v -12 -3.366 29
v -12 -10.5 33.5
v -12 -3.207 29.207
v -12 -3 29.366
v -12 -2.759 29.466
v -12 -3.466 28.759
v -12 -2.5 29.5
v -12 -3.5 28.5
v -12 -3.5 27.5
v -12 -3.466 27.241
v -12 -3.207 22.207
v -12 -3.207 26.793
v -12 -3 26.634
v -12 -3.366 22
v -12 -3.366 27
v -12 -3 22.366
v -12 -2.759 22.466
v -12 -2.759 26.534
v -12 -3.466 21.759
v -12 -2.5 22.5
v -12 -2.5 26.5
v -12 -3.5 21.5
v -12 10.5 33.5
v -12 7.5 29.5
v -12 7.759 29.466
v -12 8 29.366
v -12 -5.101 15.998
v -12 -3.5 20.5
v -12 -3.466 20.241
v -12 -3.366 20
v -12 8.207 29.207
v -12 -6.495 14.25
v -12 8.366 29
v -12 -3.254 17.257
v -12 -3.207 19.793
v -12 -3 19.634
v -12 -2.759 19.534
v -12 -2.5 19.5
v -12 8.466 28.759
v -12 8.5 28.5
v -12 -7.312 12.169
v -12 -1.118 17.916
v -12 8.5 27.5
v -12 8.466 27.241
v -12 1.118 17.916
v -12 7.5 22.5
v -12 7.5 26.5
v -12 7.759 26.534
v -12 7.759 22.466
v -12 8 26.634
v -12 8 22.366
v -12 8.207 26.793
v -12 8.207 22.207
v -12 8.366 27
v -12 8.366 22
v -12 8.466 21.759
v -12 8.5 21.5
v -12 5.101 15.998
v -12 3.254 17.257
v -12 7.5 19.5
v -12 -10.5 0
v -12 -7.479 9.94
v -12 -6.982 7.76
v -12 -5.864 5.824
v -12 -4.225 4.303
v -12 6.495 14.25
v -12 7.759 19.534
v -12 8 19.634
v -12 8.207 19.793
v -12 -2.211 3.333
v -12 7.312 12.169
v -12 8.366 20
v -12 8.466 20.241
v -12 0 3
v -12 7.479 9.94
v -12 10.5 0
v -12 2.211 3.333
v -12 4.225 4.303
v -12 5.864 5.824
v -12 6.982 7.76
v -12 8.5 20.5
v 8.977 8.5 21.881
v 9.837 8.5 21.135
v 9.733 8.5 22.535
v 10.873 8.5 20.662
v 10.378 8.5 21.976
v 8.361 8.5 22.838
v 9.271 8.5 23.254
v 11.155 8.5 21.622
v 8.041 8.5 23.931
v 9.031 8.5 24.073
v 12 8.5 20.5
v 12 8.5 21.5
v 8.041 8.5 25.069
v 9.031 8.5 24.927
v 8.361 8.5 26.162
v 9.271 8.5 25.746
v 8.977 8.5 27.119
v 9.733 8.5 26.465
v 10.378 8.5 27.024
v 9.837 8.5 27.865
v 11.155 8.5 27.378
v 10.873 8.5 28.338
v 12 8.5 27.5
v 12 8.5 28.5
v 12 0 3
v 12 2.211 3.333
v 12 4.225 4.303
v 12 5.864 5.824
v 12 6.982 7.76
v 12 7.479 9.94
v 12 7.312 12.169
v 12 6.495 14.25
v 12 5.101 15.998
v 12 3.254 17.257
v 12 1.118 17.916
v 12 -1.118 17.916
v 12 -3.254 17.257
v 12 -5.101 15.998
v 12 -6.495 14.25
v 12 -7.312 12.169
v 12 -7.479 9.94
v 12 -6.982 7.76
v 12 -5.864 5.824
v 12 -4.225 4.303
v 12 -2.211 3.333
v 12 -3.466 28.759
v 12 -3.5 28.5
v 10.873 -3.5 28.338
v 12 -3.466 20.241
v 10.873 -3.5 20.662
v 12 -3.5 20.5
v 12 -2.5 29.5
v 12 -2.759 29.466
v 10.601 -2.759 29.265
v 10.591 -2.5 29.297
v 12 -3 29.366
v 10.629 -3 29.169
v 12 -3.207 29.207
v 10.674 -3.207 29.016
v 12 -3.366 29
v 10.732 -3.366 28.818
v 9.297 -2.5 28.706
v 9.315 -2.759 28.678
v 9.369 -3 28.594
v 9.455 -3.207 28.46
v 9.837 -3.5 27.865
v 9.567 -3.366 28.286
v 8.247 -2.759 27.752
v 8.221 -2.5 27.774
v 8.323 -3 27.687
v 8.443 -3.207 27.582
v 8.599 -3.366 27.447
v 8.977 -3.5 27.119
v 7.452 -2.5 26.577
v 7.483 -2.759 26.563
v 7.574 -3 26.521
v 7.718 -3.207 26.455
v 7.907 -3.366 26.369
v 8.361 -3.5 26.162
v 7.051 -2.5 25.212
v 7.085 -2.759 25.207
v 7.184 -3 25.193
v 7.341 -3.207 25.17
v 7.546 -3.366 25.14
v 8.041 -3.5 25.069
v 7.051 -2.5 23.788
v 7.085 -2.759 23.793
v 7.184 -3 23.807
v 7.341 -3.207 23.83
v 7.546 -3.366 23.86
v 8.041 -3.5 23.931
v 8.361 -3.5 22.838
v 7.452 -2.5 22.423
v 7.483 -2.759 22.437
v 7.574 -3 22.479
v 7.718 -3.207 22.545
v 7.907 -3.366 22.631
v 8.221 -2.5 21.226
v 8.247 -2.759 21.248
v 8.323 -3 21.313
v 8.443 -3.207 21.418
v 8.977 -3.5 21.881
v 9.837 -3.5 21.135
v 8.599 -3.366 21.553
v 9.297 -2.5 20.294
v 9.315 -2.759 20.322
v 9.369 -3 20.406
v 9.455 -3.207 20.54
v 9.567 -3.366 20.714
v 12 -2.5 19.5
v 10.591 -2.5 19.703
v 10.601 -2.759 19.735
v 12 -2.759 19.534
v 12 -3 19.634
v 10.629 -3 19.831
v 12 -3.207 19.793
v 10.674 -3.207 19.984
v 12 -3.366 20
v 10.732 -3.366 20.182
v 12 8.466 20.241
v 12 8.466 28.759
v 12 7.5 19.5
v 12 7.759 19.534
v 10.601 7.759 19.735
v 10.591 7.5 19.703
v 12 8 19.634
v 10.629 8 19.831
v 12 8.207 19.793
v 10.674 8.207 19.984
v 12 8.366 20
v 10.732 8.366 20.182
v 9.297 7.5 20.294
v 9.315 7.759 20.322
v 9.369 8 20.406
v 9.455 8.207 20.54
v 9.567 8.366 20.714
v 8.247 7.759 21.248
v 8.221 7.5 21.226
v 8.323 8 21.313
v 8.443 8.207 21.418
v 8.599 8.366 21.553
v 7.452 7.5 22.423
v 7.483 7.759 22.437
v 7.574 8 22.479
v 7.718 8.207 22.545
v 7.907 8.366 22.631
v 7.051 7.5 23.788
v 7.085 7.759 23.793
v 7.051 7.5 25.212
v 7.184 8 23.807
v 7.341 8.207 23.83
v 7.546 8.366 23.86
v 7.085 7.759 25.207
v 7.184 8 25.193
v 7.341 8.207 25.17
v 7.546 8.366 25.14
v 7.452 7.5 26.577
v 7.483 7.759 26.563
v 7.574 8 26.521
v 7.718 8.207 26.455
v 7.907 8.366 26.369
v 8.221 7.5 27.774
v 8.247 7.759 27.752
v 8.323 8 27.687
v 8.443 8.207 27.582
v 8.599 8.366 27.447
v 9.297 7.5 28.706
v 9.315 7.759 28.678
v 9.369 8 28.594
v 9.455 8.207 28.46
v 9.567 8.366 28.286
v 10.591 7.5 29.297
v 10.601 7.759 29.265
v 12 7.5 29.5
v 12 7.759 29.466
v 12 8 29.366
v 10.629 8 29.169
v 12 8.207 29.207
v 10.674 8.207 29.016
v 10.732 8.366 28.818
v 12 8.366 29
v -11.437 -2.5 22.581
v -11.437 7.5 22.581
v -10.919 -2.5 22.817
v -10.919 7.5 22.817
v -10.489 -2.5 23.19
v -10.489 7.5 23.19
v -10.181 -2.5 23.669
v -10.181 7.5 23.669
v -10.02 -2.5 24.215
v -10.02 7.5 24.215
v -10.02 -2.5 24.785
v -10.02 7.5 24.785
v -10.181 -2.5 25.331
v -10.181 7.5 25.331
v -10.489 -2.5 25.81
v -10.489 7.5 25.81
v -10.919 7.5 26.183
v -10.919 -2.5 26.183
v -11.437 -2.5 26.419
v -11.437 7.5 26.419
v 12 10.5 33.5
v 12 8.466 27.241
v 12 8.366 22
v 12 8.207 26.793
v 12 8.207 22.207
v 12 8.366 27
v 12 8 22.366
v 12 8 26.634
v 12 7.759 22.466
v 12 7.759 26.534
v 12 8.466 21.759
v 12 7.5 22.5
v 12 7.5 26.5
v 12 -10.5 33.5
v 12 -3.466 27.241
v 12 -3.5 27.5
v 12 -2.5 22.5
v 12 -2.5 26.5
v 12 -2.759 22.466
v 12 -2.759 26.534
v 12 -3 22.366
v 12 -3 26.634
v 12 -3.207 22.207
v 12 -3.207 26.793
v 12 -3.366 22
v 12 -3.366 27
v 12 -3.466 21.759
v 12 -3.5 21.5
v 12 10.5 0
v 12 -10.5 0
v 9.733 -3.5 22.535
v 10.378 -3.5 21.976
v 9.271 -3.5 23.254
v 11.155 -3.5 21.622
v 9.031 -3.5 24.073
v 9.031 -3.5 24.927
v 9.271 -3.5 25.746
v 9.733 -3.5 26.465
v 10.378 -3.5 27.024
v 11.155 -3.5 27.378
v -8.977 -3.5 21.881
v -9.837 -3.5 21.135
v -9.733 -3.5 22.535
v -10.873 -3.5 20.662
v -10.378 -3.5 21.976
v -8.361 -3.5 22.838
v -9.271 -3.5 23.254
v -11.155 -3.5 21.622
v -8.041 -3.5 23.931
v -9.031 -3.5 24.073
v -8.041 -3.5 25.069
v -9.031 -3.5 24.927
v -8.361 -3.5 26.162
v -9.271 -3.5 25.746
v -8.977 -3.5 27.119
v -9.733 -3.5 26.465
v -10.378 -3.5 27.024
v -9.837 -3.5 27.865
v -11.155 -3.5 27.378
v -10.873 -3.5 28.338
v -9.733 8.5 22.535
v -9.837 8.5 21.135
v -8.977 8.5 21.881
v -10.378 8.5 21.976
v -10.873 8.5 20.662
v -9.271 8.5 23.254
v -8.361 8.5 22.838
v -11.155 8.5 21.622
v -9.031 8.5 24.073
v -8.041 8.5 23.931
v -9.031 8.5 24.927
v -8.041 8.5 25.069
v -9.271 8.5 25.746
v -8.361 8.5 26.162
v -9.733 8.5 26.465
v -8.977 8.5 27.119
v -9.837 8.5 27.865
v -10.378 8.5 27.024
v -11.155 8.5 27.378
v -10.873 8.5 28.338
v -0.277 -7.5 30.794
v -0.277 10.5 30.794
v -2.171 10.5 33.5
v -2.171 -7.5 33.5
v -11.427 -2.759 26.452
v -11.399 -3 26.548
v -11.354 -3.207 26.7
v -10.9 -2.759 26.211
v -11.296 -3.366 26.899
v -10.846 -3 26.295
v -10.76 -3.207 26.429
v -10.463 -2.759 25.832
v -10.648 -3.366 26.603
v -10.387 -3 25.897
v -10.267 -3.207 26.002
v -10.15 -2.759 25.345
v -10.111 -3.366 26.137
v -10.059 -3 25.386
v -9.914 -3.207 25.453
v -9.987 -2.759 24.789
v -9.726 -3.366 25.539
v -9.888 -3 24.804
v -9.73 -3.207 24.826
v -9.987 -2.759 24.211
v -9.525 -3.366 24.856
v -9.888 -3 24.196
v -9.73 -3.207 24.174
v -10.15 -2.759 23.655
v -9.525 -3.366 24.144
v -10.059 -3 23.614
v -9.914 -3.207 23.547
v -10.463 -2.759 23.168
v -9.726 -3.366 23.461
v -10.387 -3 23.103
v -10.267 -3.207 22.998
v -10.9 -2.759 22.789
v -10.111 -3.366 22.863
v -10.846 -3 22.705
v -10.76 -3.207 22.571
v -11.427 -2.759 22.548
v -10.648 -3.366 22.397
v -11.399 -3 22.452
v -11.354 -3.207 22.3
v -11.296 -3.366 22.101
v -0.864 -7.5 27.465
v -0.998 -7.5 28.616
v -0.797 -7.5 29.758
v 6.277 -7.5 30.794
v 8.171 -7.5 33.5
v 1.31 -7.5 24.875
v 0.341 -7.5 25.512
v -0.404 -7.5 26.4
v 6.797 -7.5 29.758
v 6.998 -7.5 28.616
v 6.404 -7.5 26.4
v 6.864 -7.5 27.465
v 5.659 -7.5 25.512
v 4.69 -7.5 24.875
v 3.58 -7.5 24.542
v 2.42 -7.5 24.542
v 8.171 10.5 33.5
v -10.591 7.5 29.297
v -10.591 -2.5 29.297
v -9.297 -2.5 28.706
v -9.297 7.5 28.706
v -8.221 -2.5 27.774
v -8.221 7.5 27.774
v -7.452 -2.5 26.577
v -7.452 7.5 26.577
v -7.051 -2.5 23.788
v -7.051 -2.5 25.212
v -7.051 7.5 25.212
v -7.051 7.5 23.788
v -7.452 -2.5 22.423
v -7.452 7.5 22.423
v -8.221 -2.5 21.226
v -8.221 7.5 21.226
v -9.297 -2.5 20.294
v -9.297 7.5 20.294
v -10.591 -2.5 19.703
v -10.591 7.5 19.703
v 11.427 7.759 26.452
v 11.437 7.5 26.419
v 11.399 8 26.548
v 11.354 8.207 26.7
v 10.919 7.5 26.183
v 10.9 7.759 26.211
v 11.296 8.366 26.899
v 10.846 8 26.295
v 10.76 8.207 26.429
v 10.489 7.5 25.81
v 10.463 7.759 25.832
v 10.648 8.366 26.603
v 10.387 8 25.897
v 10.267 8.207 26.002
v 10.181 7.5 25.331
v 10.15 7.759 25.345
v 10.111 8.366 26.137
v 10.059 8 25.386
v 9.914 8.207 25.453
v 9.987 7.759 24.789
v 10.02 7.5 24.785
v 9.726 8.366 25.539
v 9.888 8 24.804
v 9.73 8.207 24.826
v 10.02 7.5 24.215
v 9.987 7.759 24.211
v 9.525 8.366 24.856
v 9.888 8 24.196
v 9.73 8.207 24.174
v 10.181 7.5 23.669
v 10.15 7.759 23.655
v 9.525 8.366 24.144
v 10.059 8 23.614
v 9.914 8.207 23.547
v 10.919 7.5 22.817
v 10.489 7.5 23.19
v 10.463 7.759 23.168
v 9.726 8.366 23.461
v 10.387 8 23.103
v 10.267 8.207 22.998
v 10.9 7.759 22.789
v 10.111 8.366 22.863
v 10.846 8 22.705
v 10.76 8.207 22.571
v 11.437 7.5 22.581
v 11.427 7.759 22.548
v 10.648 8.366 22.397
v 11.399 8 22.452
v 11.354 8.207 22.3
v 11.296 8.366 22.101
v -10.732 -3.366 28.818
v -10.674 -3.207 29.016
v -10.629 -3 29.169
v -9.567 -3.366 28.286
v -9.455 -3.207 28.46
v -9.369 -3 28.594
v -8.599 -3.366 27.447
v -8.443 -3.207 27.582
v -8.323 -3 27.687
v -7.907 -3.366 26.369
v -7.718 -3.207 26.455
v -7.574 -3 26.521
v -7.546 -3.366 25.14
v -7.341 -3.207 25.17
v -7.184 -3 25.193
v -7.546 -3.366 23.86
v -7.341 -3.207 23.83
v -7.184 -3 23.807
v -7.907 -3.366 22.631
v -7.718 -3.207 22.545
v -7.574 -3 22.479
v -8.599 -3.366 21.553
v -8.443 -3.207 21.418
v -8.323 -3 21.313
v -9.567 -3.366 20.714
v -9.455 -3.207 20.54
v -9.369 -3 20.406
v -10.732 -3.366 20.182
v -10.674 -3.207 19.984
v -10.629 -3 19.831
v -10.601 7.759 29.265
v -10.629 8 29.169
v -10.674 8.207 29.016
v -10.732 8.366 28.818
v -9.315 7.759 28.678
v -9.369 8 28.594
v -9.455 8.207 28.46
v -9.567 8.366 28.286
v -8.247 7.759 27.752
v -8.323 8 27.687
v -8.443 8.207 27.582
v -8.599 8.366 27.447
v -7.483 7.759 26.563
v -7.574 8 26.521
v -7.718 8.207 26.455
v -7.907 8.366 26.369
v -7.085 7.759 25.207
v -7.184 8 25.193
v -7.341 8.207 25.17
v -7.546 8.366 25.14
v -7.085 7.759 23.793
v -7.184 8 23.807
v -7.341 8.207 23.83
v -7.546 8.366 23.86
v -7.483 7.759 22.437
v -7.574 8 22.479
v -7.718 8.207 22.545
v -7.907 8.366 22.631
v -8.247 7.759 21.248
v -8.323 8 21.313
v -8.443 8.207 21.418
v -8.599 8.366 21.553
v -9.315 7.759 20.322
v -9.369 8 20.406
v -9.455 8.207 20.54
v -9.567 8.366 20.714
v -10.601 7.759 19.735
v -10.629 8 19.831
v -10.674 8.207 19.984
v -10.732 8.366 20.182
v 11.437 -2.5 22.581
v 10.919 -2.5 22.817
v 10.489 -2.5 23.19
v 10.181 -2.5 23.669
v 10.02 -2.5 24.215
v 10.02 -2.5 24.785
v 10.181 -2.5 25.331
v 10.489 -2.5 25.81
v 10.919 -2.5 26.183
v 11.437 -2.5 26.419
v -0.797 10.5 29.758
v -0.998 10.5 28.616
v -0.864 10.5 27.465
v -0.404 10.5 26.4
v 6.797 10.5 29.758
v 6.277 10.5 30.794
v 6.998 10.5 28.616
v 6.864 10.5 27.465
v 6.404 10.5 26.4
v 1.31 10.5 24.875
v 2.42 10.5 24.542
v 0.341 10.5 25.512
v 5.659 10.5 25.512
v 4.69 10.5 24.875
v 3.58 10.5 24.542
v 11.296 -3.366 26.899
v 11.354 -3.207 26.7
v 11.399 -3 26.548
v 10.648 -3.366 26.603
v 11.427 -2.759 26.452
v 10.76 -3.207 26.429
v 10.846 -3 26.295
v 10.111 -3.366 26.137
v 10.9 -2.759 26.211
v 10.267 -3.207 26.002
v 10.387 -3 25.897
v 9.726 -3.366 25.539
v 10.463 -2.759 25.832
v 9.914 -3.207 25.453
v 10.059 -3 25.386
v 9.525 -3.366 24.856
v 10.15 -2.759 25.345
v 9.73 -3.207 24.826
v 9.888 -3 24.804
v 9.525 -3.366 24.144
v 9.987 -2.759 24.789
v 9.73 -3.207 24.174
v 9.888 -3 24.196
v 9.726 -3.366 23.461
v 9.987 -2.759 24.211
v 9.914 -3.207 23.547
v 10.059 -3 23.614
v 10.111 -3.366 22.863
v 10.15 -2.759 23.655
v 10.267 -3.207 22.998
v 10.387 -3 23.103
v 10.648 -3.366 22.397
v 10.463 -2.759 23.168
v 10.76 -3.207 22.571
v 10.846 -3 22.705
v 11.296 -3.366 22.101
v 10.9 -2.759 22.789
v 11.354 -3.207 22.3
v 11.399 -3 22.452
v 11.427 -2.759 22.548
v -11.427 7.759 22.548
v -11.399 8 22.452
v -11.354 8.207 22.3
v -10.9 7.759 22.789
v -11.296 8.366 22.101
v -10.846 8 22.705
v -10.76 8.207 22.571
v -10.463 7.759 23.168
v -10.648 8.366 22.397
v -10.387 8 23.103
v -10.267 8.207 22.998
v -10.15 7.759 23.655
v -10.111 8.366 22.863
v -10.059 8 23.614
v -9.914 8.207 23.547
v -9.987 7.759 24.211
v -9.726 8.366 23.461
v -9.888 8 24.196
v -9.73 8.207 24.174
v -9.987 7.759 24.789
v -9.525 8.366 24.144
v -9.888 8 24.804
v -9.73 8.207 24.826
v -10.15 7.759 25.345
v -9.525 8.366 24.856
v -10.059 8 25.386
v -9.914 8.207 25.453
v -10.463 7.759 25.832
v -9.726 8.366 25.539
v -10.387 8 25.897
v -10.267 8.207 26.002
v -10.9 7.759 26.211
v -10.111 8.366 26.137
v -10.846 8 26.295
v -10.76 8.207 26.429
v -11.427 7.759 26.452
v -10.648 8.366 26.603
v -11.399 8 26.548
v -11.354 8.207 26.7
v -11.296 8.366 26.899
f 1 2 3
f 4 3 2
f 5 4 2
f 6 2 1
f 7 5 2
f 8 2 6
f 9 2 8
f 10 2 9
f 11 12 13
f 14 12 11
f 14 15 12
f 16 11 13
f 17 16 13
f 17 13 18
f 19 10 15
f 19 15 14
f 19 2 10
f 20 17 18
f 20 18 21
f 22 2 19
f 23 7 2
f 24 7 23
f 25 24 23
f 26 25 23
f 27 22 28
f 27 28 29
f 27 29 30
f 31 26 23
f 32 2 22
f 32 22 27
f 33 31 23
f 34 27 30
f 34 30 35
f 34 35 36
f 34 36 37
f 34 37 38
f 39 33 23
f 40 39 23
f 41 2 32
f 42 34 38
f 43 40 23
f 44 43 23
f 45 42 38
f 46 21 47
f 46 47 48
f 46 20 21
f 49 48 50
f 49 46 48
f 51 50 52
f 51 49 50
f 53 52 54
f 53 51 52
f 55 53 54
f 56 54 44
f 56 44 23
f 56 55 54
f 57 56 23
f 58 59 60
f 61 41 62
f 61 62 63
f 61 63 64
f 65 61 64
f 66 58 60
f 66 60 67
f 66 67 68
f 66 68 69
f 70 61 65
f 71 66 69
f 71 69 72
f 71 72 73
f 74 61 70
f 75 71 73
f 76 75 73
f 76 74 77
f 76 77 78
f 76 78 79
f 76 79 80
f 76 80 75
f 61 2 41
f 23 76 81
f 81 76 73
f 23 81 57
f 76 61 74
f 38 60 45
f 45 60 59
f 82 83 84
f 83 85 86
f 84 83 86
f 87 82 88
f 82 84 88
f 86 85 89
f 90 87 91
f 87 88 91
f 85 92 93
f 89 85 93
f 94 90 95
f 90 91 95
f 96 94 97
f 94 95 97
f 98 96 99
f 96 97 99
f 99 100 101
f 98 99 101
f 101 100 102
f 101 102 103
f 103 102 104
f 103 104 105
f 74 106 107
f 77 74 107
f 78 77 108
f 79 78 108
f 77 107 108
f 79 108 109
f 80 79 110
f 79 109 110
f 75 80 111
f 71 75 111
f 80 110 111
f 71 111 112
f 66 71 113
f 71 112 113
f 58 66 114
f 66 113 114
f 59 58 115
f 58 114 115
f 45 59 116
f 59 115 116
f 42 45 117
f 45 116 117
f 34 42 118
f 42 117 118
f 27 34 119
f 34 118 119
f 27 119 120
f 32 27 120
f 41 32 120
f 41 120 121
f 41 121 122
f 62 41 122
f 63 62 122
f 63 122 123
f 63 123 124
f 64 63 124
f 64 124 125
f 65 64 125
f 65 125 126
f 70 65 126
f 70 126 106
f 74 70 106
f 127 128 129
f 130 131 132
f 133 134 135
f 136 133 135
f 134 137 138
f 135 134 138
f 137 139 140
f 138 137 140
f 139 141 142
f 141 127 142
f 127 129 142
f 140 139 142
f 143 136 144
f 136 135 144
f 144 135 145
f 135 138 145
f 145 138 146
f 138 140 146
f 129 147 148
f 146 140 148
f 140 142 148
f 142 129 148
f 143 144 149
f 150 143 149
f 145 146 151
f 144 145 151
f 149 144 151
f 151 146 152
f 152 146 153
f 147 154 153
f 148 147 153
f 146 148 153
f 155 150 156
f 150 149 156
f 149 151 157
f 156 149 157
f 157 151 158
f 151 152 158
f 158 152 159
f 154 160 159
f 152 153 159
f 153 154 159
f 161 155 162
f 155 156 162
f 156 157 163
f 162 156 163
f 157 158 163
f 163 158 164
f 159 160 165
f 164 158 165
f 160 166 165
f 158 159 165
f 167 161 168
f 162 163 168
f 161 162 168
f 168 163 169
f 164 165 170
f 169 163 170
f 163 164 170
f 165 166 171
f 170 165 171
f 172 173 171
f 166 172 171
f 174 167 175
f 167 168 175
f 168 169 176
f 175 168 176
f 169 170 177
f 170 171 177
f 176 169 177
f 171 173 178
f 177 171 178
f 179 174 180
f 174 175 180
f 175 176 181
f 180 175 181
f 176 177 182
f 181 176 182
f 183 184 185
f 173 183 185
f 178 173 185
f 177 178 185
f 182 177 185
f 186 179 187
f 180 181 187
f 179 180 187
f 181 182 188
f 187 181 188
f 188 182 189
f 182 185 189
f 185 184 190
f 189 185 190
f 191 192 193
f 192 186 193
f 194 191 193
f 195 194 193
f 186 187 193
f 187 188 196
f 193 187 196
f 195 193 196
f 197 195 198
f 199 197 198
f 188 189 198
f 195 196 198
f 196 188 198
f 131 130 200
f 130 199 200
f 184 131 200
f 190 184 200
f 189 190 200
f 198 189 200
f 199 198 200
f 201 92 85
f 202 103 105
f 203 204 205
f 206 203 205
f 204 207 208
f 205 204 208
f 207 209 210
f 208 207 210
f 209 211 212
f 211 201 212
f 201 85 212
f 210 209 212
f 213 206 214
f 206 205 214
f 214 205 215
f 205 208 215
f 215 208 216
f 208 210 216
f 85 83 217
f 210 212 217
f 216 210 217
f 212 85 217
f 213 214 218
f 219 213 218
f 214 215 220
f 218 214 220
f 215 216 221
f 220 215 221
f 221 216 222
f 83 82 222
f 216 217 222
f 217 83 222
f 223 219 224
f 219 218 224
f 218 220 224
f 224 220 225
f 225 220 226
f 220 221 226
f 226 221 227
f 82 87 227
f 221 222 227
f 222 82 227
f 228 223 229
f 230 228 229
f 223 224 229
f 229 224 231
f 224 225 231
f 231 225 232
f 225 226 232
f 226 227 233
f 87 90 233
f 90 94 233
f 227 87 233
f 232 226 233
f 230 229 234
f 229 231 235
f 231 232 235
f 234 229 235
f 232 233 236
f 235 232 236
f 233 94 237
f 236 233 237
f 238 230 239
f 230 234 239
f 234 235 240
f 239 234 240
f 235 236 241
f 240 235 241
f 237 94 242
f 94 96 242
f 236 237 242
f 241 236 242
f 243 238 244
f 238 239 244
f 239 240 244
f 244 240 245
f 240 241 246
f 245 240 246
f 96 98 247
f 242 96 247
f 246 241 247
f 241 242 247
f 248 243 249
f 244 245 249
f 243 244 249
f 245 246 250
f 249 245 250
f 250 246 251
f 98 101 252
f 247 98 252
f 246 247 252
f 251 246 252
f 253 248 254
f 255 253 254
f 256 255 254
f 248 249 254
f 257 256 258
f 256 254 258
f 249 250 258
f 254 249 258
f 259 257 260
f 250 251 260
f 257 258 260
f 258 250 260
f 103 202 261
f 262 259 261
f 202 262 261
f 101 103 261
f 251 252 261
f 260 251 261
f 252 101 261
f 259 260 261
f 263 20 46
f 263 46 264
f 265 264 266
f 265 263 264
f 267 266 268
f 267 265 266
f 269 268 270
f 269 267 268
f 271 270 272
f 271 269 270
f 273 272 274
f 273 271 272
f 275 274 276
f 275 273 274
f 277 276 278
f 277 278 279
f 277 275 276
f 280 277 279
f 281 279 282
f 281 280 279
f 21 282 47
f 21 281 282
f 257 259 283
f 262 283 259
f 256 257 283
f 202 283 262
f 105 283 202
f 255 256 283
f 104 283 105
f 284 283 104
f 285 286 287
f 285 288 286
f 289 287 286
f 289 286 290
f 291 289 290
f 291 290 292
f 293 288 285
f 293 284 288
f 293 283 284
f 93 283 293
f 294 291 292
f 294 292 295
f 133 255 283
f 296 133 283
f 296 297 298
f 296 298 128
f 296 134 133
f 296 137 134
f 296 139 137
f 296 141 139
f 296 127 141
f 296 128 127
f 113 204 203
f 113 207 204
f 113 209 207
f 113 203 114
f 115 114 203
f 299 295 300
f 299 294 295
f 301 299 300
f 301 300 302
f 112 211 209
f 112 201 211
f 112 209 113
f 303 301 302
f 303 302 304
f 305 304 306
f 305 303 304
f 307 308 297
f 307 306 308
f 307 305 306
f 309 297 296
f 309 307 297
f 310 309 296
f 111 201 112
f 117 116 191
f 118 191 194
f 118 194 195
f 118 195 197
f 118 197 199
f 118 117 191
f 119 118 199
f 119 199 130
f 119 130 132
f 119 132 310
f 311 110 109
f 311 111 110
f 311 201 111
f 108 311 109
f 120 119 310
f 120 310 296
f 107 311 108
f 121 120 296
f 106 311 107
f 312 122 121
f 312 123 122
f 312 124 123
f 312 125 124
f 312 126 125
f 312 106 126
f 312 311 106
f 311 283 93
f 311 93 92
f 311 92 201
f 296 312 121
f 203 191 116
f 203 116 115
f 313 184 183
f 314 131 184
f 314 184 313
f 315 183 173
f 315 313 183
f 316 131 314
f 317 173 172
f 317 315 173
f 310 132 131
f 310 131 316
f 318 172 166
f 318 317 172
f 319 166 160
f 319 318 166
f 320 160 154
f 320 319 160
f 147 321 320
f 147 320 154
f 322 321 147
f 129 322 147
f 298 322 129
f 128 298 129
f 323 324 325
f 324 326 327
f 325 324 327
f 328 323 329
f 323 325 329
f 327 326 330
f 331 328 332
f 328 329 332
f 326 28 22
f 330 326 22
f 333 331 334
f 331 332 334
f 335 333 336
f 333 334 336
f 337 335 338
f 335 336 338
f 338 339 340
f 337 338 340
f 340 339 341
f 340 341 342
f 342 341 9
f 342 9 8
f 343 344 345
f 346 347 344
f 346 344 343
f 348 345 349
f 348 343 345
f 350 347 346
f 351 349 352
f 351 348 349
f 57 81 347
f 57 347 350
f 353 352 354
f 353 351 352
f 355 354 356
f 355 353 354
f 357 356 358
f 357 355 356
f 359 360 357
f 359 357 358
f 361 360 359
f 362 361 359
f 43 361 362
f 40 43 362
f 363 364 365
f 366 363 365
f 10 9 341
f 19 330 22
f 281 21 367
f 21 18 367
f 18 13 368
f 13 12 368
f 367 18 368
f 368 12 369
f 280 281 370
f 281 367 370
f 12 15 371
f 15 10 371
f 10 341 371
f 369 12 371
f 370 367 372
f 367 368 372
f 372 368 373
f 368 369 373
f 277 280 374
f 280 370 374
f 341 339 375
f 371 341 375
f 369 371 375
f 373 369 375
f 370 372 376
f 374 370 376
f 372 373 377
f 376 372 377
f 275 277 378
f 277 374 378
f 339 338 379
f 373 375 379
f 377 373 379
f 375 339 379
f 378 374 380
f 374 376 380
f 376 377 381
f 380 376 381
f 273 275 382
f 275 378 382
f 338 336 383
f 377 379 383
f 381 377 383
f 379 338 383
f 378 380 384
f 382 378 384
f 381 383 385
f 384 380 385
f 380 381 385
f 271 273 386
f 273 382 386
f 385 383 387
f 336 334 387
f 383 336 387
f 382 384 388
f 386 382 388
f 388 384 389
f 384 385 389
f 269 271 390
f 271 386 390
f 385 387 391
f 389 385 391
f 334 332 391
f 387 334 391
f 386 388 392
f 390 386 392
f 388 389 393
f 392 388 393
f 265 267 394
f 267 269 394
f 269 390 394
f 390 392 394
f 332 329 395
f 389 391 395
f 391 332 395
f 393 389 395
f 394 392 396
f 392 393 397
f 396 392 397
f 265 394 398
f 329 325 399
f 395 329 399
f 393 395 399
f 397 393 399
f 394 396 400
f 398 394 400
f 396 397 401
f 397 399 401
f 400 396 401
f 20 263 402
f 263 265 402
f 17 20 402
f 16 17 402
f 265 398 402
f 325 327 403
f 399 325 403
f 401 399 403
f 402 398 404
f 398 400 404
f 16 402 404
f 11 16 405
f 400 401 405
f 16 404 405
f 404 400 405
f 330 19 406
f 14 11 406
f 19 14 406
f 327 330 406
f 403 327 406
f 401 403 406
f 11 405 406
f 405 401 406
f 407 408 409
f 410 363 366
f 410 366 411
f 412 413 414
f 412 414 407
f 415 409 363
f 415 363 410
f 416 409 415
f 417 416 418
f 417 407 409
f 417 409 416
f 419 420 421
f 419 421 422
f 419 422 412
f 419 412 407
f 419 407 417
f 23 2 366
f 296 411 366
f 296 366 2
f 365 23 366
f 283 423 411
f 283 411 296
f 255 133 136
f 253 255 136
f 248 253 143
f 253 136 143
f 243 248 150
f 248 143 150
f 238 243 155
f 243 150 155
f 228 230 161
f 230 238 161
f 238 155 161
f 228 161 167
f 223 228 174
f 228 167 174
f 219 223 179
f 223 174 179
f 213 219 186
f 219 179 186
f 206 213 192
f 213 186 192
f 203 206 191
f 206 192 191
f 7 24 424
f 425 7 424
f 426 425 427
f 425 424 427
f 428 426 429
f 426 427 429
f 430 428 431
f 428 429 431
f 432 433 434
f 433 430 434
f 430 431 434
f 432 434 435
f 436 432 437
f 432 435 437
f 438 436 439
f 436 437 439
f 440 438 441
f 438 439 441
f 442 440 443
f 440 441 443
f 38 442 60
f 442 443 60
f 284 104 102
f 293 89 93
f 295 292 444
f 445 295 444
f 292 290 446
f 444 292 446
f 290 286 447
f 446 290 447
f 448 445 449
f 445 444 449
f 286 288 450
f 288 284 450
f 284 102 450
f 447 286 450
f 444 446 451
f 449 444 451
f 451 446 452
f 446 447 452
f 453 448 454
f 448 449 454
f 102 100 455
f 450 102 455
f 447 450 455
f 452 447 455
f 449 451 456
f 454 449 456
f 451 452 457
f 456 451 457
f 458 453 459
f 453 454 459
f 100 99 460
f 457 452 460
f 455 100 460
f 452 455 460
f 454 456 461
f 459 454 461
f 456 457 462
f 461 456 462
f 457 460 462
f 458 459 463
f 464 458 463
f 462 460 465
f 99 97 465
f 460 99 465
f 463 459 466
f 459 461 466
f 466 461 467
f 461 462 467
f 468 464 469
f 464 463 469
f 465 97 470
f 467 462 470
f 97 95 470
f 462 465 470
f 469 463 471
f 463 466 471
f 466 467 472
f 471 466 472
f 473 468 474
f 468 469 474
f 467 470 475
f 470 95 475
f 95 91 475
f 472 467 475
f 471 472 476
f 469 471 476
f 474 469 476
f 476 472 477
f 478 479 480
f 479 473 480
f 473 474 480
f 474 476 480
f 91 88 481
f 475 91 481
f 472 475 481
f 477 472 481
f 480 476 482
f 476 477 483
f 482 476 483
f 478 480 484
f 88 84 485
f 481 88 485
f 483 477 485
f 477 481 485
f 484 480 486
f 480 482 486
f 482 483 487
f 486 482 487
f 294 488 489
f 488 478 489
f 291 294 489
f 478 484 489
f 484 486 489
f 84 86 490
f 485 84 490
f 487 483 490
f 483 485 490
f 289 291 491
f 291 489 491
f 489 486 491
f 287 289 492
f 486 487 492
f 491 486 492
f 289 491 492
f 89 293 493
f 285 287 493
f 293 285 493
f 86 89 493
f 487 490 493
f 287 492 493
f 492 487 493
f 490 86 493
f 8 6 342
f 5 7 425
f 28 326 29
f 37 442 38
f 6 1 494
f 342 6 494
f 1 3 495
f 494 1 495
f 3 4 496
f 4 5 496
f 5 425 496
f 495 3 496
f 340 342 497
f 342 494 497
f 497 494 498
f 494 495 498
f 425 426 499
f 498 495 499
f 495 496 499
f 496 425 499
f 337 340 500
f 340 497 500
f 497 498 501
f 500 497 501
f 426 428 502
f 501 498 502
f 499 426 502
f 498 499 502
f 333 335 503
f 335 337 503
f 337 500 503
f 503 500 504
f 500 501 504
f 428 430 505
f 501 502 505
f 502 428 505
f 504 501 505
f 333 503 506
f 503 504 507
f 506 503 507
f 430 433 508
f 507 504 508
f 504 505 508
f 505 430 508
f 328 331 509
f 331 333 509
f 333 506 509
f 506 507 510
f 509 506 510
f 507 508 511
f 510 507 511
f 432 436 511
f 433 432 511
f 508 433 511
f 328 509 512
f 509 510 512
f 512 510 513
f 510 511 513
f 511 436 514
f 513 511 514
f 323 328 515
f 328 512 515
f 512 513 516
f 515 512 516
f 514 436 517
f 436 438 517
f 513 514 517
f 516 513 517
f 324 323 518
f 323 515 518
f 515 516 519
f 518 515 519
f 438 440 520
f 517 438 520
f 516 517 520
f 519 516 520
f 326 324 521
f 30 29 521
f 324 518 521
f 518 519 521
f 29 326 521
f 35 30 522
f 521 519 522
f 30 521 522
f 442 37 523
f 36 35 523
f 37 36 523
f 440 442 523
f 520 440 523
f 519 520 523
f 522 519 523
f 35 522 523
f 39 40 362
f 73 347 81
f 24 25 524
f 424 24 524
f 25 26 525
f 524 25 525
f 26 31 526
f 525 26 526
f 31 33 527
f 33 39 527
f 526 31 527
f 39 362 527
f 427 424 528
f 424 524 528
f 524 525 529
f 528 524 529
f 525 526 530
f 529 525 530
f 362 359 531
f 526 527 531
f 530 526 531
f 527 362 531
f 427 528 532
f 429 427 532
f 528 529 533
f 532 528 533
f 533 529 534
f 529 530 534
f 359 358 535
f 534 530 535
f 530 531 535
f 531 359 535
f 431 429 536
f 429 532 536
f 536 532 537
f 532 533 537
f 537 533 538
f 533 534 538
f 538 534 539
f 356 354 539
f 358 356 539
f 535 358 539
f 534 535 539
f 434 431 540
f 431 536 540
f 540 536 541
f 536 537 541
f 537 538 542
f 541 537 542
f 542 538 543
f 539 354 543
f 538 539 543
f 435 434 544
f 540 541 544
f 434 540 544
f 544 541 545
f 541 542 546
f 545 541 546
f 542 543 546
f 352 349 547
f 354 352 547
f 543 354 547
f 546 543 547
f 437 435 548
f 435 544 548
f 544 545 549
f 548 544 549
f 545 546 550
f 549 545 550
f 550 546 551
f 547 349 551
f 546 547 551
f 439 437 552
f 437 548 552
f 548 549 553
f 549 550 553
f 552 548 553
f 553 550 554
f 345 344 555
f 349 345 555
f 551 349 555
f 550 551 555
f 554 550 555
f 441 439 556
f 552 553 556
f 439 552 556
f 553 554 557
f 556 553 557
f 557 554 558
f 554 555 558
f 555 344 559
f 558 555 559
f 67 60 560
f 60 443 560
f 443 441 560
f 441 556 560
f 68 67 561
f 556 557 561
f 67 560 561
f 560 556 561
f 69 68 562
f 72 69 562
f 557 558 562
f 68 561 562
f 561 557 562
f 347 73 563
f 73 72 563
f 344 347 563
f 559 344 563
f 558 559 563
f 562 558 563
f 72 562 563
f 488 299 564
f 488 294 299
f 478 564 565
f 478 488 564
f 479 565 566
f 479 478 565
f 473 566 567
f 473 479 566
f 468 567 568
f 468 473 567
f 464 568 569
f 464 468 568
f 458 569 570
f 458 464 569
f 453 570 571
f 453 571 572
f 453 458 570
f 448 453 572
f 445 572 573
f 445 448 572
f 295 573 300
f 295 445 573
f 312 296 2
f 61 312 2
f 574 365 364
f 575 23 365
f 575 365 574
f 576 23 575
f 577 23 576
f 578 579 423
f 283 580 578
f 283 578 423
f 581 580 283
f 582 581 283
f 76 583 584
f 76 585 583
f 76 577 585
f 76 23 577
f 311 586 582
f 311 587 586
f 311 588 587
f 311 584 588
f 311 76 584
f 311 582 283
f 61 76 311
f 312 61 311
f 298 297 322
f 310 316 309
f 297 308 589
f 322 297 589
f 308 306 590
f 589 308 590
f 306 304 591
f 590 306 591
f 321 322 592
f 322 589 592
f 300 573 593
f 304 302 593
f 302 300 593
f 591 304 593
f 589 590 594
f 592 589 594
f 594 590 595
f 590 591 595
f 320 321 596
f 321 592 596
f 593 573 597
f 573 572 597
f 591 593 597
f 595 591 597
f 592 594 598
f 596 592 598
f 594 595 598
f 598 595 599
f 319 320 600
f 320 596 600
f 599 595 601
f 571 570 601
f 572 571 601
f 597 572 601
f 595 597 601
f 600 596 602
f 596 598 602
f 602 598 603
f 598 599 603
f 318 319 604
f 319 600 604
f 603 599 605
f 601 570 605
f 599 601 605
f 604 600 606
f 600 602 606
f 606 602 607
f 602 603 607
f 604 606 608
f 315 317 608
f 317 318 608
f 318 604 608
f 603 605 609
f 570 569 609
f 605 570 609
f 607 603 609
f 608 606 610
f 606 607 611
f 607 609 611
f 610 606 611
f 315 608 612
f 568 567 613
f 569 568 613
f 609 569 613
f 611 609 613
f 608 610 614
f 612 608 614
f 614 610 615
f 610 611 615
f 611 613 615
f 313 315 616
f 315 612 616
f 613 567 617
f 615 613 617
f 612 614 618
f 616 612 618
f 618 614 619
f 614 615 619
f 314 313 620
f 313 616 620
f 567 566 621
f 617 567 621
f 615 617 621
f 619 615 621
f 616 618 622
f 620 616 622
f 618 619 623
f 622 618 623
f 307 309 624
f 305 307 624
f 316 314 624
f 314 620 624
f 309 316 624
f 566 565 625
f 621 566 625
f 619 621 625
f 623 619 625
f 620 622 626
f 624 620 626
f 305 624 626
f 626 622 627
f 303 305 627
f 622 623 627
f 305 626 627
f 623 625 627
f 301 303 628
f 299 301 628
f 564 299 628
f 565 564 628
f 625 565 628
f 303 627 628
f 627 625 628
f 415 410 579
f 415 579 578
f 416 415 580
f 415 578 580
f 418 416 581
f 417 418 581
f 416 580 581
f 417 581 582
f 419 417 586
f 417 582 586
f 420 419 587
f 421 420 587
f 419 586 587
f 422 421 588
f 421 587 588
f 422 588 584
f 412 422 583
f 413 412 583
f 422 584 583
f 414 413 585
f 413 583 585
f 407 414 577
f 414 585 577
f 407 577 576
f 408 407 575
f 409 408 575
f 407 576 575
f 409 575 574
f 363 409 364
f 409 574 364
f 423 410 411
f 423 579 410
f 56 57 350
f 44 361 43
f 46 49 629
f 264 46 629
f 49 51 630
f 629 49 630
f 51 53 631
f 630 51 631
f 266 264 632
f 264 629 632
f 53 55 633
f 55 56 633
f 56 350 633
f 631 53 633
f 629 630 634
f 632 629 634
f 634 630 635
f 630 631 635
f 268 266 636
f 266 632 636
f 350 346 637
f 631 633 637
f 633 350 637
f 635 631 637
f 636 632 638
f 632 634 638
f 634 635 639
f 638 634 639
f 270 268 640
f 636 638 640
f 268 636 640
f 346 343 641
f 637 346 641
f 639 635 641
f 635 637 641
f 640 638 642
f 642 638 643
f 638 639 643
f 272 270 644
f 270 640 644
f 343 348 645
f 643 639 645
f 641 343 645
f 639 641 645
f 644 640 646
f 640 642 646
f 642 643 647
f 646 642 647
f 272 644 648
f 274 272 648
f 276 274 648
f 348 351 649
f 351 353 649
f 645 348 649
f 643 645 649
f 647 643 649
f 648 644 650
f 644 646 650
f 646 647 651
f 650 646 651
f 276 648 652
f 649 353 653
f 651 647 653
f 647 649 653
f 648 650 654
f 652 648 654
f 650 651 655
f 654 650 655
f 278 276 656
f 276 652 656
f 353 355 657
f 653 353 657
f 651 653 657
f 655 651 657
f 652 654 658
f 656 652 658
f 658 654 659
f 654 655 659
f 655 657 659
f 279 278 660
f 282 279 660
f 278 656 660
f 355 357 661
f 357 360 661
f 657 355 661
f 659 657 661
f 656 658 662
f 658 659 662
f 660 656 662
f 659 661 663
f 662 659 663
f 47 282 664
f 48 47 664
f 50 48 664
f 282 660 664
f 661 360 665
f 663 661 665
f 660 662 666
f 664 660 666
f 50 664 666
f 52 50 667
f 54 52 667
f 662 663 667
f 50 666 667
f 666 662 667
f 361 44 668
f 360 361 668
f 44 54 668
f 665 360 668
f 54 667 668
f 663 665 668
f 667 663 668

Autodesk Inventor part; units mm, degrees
ref_plane "YZ Plane" through (0, 0, 0) normal (1, 0, 0) x (0, 1, 0)
ref_plane "XZ Plane" through (0, 0, 0) normal (0, 1, 0) x (-1, 0, 0)
ref_plane "XY Plane" through (0, 0, 0) normal (0, 0, 1) x (1, 0, 0)
sketch "Sketch1" plane through (0, 0, 0) normal (0, 0, 1) x (1, 0, 0)
  line L0 (-12, 10.5) -> (12, 10.5)
  line L1 (12, 10.5) -> (12, -10.5)
  line L2 (12, -10.5) -> (-12, -10.5)
  line L3 (-12, -10.5) -> (-12, 10.5)
  point P0 (0, 0)
  dimension "d0" = 24
  dimension "d1" = 12
  dimension "d2" = 21
  dimension "d3" = 10.5
extrude "Blok" add sketch "Sketch1" along normal blind 33.5
sketch "Sketch2" plane through (12, -10.5, 0) normal (1, 0, 0) x (0, 0, -1)
  line L0 (0, 0) -> (-33.5, 0) projected
  line L1 (-28.5, 0) -> (-28.5, 21) construction
  line L2 (0, 21) -> (-33.5, 21) projected
  circle A0 centre (-10.5, 10.5) radius 7.5
  line L3 (0, 21) -> (0, 0) projected
  line L4 (-32.5, 21) -> (-32.5, 0) construction
  line L5 (-24.5, 21) -> (-24.5, 0) construction
  line L6 (0, 0) -> (-33.5, 0) projected
  line L7 (-33.5, 0) -> (-33.5, 21) projected
  point P0 (0, 10.5)
  dimension "d6" = 15
  dimension "d7" = 18
  dimension "d8" = 10.5
  dimension "d9" = 10.5
  dimension "d10" = 10.5
  dimension "d11" = 4
  dimension "d12" = 4
  dimension "d13" = 1
extrude "Lejehul" cut sketch "Sketch2" against normal up to surface (24 mm away) contours A0
sketch "Sketch3" plane through (-12, 10.5, 0) normal (0, 1, 0) x (1, 0, 0)
  line L0 (0, -18) -> (0, -3) construction
  line L1 (24, -3) -> (24, -18) construction
  line L2 (24, 0) -> (24, -33.5) projected
  line L3 (0, -18) -> (24, -18) construction
  line L4 (0, -3) -> (24, -3) construction
  line L5 (0, 0) -> (0, -33.5) projected
  line L6 (0, -3) -> (24, -18) construction
  line L7 (24, -10.5) -> (0, -10.5) construction
  line L8 (24, -28.5) -> (0, -28.5) construction
  arc A0 (18.2766, -30.7943) -> (11.7234, -30.7943) centre (15, -28.5) ccw
  line L9 (11.7234, -30.7943) -> (8.2936, -25.896) construction
  line L10 (18.2766, -30.7943) -> (20.9993, -26.9059) construction
  line L11 (11.7234, -30.7943) -> (18.2766, -30.7943) construction
  line L12 (11.7234, -30.7943) -> (9.8288, -33.5)
  line L13 (18.2766, -30.7943) -> (20.1712, -33.5)
  line L14 (9.8288, -33.5) -> (0, -33.5) construction
  line L15 (20.1712, -33.5) -> (24, -33.5) construction
  line L16 (24, -33.5) -> (24, -33.5)
  line L17 (0, -33.5) -> (0, -33.5)
  line L18 (0, 0) -> (24, 0) projected
  line L19 (24, -33.5) -> (0, -33.5) construction
  line L20 (9.8288, -33.5) -> (20.1712, -33.5)
  line L21 (15, -28.5) -> (15, -33.5)
  point P0 (12, 0)
  point P1 (12, -10.5)
  dimension "d19" = 18
  dimension "d20" = 8
  dimension "d24" = 110
  dimension "d25" = 110
  dimension "d29" = 9
  dimension "d30" = 35
extrude "Tværstang" cut sketch "Sketch3" against normal blind 18
sketch "Sketch4" plane through (12, -10.5, 0) normal (1, 0, 0) x (0, 0, -1)
  line L0 (-29.5, 7) -> (-26.5, 7)
  line L1 (-26.5, 7) -> (-26.5, 19)
  line L2 (-26.5, 19) -> (-29.5, 19)
  line L3 (-29.5, 19) -> (-29.5, 7)
  line L4 (0, 0) -> (-33.5, 0) projected
  line L5 (-33.5, 0) -> (-33.5, 21) projected
  line L6 (-24.5, 2) -> (-24.5, 9) construction
  line L7 (0, 21) -> (-33.5, 21) projected
  point P0 (0, 10.5)
  dimension "d32" = 3
  dimension "d34" = 4
  dimension "d35" = 2
  dimension "d37" = 2
  dimension "d41" = 12
revolve "Revolution1" cut sketch "Sketch4" angle 360 about axis through (12, -8.5, 24.5) along (0, 1, 0)
sketch "Sketch5" plane through (-12, -10.5, 0) normal (-1, 0, 0) x (0, 0, 1)
  line L0 (26.5, 7) -> (29.5, 7) projected
  line L1 (26.5, 19) -> (26.5, 7) projected
  line L2 (29.5, 19) -> (26.5, 19) projected
  line L3 (29.5, 7) -> (29.5, 19) projected
  line L4 (24.5, 19) -> (24.5, 12)
  point P0 (0, 10.5)
  dimension "d38" = 2
revolve "Revolution2" cut sketch "Sketch5" angle 360 about axis through (-12, 8.5, 24.5) along (0, -1, 0)
fillet "Fillet1" radius 1 8 edges at (7, -3.5, 24.5) (10, -3.5, 24.5) (7, 8.5, 24.5) (10, 8.5, 24.5) (-7, 8.5, 24.5) (-10, 8.5, 24.5) (-7, -3.5, 24.5) (-10, -3.5, 24.5)
equation "\"d1\" = 0.5 * d0"
equation "\"d3\" = 0.5 * d2"
equation "\"d8\" = d9"
equation "\"d12\" = d11"
equation "\"d25\" = d24"
properties part number "XY v2"
